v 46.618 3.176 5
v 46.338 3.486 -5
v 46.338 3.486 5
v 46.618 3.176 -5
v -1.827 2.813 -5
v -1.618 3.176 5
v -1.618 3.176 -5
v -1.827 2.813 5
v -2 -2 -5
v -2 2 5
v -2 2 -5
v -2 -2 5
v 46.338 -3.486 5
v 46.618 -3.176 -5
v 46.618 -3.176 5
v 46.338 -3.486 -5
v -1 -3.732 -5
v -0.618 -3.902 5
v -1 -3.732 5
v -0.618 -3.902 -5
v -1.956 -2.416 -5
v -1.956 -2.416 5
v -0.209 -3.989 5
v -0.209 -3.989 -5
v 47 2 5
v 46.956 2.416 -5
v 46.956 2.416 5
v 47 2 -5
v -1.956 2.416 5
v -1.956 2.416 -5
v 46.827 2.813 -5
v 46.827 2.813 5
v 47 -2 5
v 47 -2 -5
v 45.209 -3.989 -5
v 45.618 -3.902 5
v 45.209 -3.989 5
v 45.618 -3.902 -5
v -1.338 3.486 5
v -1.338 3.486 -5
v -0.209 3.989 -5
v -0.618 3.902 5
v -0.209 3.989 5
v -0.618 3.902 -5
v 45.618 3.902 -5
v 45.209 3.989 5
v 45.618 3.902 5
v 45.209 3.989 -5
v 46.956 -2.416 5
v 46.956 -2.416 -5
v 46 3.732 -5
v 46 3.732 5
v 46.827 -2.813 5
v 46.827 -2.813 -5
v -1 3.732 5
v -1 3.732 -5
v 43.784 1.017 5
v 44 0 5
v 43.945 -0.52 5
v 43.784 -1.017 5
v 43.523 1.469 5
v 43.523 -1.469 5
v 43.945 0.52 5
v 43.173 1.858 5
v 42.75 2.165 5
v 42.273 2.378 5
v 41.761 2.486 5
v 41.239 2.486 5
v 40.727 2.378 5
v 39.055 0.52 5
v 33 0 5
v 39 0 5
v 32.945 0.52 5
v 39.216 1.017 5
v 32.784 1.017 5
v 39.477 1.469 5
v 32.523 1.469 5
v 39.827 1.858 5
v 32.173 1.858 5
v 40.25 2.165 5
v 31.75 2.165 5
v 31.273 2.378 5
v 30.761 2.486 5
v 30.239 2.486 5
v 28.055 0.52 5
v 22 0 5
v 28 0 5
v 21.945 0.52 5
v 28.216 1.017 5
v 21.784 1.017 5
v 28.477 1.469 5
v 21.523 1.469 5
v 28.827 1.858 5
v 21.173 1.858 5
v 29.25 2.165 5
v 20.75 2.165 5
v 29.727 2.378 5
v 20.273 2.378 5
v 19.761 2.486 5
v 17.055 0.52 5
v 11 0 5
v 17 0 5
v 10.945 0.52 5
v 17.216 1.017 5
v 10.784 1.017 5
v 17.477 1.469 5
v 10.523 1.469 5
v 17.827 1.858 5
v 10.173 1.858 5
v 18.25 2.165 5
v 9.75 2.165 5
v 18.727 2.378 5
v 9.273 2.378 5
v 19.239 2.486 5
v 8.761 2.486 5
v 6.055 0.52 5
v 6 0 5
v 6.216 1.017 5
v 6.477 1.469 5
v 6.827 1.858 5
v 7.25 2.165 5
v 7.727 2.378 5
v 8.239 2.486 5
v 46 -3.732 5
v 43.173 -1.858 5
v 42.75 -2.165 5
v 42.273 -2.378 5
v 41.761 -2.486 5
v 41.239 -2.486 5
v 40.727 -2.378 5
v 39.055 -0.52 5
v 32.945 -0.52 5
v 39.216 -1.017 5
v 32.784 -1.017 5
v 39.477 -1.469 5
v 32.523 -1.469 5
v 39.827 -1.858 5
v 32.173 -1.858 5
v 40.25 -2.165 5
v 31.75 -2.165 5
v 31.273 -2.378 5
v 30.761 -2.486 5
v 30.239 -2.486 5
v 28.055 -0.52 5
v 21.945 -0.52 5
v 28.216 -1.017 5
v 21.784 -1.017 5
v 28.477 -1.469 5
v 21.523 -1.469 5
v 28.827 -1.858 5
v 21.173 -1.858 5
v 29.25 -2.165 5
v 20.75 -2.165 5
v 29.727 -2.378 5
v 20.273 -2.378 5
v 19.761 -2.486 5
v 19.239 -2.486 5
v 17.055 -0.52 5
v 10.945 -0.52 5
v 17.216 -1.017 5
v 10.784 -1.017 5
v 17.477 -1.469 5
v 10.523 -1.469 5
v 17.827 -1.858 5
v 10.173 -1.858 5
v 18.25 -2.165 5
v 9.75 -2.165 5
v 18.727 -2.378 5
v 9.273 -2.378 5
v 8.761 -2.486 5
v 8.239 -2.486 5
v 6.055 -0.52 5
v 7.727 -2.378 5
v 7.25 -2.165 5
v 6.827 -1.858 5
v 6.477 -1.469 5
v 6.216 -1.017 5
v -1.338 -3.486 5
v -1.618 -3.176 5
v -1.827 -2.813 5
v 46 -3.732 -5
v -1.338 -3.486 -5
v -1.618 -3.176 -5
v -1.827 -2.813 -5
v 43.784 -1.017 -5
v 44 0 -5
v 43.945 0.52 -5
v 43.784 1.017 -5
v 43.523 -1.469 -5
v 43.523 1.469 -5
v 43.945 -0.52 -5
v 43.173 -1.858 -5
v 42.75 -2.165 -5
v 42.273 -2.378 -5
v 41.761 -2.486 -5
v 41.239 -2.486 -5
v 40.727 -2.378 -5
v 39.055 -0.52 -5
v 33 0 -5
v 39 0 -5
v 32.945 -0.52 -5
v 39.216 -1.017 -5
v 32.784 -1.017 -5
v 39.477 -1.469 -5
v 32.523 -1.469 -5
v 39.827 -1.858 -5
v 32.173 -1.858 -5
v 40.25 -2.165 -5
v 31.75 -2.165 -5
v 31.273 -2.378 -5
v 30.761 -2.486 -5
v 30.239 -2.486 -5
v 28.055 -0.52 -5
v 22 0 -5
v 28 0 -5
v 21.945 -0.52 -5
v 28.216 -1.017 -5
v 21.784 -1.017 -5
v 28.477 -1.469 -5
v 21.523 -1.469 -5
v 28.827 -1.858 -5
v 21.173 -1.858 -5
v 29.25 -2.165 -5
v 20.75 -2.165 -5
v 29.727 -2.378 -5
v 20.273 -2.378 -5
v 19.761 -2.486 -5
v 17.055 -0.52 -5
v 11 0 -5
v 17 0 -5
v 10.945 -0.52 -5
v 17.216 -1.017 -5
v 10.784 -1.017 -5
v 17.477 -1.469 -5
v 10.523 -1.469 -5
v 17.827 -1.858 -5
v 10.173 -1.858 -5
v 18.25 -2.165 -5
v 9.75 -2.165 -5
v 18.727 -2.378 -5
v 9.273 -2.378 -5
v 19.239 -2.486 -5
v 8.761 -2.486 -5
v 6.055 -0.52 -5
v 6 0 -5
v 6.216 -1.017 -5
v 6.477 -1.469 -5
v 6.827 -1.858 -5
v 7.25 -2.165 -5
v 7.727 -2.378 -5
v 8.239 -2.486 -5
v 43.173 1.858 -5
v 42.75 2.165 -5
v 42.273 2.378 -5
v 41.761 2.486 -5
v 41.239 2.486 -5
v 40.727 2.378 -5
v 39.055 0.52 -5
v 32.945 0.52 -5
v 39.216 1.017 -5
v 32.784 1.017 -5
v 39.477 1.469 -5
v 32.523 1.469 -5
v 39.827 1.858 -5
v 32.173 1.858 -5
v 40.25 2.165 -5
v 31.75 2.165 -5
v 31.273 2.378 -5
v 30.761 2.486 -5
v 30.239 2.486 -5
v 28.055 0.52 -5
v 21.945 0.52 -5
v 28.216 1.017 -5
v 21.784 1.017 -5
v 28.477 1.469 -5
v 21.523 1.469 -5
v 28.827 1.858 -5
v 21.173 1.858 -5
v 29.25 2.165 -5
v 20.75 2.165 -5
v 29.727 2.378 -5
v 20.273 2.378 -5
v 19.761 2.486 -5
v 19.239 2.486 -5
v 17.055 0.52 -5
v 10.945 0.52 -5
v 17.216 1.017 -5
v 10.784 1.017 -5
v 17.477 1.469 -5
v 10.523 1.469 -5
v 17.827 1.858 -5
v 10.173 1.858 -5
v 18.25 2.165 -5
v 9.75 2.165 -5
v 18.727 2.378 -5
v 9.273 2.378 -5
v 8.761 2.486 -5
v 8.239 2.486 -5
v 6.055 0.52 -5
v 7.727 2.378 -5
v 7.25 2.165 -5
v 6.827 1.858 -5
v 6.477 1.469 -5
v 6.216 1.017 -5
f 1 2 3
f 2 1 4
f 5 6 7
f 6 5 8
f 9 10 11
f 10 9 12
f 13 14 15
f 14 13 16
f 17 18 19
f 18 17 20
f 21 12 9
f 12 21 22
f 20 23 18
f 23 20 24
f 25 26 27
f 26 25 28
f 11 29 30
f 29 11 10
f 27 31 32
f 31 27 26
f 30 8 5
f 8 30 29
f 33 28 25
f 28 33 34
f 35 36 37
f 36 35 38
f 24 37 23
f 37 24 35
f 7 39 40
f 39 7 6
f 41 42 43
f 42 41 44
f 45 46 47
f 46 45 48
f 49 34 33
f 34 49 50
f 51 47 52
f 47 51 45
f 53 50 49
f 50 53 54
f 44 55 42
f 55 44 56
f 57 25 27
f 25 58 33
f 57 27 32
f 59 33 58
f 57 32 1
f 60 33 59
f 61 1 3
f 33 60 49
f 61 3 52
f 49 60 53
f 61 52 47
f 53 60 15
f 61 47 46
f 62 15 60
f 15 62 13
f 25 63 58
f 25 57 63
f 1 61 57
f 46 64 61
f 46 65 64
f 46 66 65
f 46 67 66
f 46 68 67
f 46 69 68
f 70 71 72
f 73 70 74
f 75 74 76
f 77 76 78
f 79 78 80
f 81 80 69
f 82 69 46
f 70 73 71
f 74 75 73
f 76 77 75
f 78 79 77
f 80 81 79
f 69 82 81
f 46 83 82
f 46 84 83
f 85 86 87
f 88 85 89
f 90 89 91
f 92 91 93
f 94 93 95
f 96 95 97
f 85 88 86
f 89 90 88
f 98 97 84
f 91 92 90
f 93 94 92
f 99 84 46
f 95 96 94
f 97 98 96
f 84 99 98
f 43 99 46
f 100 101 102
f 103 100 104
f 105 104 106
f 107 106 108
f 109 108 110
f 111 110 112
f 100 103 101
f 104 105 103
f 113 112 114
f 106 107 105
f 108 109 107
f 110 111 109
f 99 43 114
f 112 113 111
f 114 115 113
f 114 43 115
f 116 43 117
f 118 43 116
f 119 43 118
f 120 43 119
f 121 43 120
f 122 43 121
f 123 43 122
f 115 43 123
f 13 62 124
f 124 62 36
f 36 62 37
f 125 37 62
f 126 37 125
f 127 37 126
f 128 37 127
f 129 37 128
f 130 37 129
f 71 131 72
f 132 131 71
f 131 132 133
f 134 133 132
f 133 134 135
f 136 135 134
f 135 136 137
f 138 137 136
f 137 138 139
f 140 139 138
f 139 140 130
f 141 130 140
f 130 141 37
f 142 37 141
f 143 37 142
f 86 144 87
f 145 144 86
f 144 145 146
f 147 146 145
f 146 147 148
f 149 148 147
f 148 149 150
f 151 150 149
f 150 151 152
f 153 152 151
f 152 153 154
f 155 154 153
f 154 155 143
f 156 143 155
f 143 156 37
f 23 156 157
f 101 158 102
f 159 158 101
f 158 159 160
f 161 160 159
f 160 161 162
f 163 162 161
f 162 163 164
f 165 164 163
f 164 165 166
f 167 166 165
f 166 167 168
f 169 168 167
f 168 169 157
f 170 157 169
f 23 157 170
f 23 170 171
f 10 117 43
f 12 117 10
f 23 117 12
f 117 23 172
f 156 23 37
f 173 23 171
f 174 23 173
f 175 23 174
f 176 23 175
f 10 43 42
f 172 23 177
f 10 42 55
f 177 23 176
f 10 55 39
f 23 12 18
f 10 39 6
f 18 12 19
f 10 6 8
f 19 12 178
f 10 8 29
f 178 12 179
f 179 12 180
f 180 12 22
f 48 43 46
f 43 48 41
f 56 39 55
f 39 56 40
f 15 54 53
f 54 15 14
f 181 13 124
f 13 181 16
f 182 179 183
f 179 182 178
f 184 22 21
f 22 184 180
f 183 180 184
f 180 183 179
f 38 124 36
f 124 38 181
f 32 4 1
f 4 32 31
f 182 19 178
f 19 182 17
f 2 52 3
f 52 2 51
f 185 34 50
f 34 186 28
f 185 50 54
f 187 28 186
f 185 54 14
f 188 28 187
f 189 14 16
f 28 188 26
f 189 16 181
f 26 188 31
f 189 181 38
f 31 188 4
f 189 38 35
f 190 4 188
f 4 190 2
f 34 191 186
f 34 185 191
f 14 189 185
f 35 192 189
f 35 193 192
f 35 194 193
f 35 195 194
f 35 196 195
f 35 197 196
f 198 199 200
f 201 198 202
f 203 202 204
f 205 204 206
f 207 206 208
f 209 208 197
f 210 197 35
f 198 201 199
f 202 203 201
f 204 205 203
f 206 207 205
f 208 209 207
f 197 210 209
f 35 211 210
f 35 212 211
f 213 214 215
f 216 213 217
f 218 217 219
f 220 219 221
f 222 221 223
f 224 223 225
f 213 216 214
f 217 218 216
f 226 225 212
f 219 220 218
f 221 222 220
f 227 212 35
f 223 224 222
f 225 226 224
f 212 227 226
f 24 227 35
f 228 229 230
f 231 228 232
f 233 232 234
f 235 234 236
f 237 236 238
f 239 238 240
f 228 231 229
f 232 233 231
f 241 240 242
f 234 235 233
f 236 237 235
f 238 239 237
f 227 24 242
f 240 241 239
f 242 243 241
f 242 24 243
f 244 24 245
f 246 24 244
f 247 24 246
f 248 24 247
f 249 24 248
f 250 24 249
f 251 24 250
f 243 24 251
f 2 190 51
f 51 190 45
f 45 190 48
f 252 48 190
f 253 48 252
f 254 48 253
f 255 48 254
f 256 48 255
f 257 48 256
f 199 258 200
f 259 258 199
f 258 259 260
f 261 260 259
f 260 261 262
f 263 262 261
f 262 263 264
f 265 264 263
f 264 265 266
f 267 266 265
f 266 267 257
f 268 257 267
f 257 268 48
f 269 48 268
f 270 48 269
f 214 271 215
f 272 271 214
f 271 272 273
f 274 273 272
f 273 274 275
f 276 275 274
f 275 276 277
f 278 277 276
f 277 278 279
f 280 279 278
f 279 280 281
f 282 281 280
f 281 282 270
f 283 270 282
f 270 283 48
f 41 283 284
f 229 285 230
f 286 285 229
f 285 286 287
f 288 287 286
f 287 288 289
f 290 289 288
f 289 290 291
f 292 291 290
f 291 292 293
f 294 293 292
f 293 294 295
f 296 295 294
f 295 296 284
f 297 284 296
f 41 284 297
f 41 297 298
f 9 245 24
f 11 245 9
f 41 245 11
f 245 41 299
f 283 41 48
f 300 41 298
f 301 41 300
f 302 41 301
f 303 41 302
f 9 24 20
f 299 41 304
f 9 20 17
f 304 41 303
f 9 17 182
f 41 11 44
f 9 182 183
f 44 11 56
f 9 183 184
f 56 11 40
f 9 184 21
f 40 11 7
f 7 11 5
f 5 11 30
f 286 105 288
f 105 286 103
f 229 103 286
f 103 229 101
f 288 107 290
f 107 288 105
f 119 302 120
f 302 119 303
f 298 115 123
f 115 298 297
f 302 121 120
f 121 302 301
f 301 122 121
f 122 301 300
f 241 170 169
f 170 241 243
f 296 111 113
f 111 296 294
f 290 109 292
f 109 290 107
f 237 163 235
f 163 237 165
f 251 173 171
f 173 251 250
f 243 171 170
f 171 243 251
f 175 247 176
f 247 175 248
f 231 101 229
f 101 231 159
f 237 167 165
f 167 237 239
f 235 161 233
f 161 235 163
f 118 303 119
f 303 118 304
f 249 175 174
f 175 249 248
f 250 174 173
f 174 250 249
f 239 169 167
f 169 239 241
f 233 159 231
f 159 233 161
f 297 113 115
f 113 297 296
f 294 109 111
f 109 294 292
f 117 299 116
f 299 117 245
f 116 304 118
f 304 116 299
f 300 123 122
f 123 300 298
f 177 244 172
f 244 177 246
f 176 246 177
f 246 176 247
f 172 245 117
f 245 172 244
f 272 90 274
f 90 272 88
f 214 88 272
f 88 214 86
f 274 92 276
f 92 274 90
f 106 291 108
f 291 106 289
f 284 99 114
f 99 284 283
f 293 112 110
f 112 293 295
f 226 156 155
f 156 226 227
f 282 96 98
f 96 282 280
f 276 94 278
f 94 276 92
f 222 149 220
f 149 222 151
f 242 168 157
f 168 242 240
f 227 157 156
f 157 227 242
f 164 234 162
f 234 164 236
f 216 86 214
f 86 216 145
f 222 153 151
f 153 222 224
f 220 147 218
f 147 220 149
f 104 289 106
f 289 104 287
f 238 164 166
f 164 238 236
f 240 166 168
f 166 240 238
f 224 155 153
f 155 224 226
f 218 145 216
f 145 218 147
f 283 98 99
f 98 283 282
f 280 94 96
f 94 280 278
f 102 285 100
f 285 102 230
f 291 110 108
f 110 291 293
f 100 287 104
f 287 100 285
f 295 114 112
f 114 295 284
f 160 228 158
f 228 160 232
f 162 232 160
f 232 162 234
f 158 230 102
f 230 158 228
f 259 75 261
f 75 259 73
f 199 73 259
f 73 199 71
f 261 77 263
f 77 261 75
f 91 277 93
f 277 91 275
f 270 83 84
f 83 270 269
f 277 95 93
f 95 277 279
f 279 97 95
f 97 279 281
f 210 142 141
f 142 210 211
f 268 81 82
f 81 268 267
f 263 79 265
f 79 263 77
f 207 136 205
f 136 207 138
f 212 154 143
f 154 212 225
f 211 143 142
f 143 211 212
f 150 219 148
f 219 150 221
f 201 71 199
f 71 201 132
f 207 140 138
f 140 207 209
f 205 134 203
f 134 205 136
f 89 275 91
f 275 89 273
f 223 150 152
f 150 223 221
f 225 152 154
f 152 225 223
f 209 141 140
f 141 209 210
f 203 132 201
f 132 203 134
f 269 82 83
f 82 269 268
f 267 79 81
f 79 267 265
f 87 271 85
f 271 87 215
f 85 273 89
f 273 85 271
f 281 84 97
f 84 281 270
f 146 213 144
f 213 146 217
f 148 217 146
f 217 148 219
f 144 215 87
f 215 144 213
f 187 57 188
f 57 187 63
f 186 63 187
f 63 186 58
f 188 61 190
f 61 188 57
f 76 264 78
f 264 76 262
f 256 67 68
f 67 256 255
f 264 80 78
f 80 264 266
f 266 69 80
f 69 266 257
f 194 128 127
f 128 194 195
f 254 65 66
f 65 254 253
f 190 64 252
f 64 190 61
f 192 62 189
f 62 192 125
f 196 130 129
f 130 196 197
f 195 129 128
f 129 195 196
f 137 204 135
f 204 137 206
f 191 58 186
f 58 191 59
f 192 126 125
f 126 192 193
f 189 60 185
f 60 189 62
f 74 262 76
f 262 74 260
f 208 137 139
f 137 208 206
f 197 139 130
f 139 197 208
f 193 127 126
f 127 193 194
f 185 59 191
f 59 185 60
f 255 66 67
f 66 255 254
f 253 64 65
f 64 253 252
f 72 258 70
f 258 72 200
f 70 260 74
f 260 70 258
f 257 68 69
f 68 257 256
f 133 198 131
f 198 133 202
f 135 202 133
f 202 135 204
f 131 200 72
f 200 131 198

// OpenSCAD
$fn=30;
height=10;
radius=2;
difference(){
    hull(){
        translate([0,-2,0])cylinder(r=radius,h=height, center=true);
        translate([45,2,0])cylinder(r=radius,h=height, center=true);
        translate([0,2,0])cylinder(r=radius,h=height, center=true);
        translate([45,-2,0])cylinder(r=radius,h=height, center=true);
  }
    translate([8.5,0,0])cylinder(d=radius/0.4,h=height*10, center=true);
    translate([19.5,0,0])cylinder(d=radius/0.4,h=height*10, center=true);
    translate([30.5,0,0])cylinder(d=radius/0.4,h=height*10, center=true);
    translate([41.5,0,0])cylinder(d=radius/0.4,h=height*10, center=true);
}
